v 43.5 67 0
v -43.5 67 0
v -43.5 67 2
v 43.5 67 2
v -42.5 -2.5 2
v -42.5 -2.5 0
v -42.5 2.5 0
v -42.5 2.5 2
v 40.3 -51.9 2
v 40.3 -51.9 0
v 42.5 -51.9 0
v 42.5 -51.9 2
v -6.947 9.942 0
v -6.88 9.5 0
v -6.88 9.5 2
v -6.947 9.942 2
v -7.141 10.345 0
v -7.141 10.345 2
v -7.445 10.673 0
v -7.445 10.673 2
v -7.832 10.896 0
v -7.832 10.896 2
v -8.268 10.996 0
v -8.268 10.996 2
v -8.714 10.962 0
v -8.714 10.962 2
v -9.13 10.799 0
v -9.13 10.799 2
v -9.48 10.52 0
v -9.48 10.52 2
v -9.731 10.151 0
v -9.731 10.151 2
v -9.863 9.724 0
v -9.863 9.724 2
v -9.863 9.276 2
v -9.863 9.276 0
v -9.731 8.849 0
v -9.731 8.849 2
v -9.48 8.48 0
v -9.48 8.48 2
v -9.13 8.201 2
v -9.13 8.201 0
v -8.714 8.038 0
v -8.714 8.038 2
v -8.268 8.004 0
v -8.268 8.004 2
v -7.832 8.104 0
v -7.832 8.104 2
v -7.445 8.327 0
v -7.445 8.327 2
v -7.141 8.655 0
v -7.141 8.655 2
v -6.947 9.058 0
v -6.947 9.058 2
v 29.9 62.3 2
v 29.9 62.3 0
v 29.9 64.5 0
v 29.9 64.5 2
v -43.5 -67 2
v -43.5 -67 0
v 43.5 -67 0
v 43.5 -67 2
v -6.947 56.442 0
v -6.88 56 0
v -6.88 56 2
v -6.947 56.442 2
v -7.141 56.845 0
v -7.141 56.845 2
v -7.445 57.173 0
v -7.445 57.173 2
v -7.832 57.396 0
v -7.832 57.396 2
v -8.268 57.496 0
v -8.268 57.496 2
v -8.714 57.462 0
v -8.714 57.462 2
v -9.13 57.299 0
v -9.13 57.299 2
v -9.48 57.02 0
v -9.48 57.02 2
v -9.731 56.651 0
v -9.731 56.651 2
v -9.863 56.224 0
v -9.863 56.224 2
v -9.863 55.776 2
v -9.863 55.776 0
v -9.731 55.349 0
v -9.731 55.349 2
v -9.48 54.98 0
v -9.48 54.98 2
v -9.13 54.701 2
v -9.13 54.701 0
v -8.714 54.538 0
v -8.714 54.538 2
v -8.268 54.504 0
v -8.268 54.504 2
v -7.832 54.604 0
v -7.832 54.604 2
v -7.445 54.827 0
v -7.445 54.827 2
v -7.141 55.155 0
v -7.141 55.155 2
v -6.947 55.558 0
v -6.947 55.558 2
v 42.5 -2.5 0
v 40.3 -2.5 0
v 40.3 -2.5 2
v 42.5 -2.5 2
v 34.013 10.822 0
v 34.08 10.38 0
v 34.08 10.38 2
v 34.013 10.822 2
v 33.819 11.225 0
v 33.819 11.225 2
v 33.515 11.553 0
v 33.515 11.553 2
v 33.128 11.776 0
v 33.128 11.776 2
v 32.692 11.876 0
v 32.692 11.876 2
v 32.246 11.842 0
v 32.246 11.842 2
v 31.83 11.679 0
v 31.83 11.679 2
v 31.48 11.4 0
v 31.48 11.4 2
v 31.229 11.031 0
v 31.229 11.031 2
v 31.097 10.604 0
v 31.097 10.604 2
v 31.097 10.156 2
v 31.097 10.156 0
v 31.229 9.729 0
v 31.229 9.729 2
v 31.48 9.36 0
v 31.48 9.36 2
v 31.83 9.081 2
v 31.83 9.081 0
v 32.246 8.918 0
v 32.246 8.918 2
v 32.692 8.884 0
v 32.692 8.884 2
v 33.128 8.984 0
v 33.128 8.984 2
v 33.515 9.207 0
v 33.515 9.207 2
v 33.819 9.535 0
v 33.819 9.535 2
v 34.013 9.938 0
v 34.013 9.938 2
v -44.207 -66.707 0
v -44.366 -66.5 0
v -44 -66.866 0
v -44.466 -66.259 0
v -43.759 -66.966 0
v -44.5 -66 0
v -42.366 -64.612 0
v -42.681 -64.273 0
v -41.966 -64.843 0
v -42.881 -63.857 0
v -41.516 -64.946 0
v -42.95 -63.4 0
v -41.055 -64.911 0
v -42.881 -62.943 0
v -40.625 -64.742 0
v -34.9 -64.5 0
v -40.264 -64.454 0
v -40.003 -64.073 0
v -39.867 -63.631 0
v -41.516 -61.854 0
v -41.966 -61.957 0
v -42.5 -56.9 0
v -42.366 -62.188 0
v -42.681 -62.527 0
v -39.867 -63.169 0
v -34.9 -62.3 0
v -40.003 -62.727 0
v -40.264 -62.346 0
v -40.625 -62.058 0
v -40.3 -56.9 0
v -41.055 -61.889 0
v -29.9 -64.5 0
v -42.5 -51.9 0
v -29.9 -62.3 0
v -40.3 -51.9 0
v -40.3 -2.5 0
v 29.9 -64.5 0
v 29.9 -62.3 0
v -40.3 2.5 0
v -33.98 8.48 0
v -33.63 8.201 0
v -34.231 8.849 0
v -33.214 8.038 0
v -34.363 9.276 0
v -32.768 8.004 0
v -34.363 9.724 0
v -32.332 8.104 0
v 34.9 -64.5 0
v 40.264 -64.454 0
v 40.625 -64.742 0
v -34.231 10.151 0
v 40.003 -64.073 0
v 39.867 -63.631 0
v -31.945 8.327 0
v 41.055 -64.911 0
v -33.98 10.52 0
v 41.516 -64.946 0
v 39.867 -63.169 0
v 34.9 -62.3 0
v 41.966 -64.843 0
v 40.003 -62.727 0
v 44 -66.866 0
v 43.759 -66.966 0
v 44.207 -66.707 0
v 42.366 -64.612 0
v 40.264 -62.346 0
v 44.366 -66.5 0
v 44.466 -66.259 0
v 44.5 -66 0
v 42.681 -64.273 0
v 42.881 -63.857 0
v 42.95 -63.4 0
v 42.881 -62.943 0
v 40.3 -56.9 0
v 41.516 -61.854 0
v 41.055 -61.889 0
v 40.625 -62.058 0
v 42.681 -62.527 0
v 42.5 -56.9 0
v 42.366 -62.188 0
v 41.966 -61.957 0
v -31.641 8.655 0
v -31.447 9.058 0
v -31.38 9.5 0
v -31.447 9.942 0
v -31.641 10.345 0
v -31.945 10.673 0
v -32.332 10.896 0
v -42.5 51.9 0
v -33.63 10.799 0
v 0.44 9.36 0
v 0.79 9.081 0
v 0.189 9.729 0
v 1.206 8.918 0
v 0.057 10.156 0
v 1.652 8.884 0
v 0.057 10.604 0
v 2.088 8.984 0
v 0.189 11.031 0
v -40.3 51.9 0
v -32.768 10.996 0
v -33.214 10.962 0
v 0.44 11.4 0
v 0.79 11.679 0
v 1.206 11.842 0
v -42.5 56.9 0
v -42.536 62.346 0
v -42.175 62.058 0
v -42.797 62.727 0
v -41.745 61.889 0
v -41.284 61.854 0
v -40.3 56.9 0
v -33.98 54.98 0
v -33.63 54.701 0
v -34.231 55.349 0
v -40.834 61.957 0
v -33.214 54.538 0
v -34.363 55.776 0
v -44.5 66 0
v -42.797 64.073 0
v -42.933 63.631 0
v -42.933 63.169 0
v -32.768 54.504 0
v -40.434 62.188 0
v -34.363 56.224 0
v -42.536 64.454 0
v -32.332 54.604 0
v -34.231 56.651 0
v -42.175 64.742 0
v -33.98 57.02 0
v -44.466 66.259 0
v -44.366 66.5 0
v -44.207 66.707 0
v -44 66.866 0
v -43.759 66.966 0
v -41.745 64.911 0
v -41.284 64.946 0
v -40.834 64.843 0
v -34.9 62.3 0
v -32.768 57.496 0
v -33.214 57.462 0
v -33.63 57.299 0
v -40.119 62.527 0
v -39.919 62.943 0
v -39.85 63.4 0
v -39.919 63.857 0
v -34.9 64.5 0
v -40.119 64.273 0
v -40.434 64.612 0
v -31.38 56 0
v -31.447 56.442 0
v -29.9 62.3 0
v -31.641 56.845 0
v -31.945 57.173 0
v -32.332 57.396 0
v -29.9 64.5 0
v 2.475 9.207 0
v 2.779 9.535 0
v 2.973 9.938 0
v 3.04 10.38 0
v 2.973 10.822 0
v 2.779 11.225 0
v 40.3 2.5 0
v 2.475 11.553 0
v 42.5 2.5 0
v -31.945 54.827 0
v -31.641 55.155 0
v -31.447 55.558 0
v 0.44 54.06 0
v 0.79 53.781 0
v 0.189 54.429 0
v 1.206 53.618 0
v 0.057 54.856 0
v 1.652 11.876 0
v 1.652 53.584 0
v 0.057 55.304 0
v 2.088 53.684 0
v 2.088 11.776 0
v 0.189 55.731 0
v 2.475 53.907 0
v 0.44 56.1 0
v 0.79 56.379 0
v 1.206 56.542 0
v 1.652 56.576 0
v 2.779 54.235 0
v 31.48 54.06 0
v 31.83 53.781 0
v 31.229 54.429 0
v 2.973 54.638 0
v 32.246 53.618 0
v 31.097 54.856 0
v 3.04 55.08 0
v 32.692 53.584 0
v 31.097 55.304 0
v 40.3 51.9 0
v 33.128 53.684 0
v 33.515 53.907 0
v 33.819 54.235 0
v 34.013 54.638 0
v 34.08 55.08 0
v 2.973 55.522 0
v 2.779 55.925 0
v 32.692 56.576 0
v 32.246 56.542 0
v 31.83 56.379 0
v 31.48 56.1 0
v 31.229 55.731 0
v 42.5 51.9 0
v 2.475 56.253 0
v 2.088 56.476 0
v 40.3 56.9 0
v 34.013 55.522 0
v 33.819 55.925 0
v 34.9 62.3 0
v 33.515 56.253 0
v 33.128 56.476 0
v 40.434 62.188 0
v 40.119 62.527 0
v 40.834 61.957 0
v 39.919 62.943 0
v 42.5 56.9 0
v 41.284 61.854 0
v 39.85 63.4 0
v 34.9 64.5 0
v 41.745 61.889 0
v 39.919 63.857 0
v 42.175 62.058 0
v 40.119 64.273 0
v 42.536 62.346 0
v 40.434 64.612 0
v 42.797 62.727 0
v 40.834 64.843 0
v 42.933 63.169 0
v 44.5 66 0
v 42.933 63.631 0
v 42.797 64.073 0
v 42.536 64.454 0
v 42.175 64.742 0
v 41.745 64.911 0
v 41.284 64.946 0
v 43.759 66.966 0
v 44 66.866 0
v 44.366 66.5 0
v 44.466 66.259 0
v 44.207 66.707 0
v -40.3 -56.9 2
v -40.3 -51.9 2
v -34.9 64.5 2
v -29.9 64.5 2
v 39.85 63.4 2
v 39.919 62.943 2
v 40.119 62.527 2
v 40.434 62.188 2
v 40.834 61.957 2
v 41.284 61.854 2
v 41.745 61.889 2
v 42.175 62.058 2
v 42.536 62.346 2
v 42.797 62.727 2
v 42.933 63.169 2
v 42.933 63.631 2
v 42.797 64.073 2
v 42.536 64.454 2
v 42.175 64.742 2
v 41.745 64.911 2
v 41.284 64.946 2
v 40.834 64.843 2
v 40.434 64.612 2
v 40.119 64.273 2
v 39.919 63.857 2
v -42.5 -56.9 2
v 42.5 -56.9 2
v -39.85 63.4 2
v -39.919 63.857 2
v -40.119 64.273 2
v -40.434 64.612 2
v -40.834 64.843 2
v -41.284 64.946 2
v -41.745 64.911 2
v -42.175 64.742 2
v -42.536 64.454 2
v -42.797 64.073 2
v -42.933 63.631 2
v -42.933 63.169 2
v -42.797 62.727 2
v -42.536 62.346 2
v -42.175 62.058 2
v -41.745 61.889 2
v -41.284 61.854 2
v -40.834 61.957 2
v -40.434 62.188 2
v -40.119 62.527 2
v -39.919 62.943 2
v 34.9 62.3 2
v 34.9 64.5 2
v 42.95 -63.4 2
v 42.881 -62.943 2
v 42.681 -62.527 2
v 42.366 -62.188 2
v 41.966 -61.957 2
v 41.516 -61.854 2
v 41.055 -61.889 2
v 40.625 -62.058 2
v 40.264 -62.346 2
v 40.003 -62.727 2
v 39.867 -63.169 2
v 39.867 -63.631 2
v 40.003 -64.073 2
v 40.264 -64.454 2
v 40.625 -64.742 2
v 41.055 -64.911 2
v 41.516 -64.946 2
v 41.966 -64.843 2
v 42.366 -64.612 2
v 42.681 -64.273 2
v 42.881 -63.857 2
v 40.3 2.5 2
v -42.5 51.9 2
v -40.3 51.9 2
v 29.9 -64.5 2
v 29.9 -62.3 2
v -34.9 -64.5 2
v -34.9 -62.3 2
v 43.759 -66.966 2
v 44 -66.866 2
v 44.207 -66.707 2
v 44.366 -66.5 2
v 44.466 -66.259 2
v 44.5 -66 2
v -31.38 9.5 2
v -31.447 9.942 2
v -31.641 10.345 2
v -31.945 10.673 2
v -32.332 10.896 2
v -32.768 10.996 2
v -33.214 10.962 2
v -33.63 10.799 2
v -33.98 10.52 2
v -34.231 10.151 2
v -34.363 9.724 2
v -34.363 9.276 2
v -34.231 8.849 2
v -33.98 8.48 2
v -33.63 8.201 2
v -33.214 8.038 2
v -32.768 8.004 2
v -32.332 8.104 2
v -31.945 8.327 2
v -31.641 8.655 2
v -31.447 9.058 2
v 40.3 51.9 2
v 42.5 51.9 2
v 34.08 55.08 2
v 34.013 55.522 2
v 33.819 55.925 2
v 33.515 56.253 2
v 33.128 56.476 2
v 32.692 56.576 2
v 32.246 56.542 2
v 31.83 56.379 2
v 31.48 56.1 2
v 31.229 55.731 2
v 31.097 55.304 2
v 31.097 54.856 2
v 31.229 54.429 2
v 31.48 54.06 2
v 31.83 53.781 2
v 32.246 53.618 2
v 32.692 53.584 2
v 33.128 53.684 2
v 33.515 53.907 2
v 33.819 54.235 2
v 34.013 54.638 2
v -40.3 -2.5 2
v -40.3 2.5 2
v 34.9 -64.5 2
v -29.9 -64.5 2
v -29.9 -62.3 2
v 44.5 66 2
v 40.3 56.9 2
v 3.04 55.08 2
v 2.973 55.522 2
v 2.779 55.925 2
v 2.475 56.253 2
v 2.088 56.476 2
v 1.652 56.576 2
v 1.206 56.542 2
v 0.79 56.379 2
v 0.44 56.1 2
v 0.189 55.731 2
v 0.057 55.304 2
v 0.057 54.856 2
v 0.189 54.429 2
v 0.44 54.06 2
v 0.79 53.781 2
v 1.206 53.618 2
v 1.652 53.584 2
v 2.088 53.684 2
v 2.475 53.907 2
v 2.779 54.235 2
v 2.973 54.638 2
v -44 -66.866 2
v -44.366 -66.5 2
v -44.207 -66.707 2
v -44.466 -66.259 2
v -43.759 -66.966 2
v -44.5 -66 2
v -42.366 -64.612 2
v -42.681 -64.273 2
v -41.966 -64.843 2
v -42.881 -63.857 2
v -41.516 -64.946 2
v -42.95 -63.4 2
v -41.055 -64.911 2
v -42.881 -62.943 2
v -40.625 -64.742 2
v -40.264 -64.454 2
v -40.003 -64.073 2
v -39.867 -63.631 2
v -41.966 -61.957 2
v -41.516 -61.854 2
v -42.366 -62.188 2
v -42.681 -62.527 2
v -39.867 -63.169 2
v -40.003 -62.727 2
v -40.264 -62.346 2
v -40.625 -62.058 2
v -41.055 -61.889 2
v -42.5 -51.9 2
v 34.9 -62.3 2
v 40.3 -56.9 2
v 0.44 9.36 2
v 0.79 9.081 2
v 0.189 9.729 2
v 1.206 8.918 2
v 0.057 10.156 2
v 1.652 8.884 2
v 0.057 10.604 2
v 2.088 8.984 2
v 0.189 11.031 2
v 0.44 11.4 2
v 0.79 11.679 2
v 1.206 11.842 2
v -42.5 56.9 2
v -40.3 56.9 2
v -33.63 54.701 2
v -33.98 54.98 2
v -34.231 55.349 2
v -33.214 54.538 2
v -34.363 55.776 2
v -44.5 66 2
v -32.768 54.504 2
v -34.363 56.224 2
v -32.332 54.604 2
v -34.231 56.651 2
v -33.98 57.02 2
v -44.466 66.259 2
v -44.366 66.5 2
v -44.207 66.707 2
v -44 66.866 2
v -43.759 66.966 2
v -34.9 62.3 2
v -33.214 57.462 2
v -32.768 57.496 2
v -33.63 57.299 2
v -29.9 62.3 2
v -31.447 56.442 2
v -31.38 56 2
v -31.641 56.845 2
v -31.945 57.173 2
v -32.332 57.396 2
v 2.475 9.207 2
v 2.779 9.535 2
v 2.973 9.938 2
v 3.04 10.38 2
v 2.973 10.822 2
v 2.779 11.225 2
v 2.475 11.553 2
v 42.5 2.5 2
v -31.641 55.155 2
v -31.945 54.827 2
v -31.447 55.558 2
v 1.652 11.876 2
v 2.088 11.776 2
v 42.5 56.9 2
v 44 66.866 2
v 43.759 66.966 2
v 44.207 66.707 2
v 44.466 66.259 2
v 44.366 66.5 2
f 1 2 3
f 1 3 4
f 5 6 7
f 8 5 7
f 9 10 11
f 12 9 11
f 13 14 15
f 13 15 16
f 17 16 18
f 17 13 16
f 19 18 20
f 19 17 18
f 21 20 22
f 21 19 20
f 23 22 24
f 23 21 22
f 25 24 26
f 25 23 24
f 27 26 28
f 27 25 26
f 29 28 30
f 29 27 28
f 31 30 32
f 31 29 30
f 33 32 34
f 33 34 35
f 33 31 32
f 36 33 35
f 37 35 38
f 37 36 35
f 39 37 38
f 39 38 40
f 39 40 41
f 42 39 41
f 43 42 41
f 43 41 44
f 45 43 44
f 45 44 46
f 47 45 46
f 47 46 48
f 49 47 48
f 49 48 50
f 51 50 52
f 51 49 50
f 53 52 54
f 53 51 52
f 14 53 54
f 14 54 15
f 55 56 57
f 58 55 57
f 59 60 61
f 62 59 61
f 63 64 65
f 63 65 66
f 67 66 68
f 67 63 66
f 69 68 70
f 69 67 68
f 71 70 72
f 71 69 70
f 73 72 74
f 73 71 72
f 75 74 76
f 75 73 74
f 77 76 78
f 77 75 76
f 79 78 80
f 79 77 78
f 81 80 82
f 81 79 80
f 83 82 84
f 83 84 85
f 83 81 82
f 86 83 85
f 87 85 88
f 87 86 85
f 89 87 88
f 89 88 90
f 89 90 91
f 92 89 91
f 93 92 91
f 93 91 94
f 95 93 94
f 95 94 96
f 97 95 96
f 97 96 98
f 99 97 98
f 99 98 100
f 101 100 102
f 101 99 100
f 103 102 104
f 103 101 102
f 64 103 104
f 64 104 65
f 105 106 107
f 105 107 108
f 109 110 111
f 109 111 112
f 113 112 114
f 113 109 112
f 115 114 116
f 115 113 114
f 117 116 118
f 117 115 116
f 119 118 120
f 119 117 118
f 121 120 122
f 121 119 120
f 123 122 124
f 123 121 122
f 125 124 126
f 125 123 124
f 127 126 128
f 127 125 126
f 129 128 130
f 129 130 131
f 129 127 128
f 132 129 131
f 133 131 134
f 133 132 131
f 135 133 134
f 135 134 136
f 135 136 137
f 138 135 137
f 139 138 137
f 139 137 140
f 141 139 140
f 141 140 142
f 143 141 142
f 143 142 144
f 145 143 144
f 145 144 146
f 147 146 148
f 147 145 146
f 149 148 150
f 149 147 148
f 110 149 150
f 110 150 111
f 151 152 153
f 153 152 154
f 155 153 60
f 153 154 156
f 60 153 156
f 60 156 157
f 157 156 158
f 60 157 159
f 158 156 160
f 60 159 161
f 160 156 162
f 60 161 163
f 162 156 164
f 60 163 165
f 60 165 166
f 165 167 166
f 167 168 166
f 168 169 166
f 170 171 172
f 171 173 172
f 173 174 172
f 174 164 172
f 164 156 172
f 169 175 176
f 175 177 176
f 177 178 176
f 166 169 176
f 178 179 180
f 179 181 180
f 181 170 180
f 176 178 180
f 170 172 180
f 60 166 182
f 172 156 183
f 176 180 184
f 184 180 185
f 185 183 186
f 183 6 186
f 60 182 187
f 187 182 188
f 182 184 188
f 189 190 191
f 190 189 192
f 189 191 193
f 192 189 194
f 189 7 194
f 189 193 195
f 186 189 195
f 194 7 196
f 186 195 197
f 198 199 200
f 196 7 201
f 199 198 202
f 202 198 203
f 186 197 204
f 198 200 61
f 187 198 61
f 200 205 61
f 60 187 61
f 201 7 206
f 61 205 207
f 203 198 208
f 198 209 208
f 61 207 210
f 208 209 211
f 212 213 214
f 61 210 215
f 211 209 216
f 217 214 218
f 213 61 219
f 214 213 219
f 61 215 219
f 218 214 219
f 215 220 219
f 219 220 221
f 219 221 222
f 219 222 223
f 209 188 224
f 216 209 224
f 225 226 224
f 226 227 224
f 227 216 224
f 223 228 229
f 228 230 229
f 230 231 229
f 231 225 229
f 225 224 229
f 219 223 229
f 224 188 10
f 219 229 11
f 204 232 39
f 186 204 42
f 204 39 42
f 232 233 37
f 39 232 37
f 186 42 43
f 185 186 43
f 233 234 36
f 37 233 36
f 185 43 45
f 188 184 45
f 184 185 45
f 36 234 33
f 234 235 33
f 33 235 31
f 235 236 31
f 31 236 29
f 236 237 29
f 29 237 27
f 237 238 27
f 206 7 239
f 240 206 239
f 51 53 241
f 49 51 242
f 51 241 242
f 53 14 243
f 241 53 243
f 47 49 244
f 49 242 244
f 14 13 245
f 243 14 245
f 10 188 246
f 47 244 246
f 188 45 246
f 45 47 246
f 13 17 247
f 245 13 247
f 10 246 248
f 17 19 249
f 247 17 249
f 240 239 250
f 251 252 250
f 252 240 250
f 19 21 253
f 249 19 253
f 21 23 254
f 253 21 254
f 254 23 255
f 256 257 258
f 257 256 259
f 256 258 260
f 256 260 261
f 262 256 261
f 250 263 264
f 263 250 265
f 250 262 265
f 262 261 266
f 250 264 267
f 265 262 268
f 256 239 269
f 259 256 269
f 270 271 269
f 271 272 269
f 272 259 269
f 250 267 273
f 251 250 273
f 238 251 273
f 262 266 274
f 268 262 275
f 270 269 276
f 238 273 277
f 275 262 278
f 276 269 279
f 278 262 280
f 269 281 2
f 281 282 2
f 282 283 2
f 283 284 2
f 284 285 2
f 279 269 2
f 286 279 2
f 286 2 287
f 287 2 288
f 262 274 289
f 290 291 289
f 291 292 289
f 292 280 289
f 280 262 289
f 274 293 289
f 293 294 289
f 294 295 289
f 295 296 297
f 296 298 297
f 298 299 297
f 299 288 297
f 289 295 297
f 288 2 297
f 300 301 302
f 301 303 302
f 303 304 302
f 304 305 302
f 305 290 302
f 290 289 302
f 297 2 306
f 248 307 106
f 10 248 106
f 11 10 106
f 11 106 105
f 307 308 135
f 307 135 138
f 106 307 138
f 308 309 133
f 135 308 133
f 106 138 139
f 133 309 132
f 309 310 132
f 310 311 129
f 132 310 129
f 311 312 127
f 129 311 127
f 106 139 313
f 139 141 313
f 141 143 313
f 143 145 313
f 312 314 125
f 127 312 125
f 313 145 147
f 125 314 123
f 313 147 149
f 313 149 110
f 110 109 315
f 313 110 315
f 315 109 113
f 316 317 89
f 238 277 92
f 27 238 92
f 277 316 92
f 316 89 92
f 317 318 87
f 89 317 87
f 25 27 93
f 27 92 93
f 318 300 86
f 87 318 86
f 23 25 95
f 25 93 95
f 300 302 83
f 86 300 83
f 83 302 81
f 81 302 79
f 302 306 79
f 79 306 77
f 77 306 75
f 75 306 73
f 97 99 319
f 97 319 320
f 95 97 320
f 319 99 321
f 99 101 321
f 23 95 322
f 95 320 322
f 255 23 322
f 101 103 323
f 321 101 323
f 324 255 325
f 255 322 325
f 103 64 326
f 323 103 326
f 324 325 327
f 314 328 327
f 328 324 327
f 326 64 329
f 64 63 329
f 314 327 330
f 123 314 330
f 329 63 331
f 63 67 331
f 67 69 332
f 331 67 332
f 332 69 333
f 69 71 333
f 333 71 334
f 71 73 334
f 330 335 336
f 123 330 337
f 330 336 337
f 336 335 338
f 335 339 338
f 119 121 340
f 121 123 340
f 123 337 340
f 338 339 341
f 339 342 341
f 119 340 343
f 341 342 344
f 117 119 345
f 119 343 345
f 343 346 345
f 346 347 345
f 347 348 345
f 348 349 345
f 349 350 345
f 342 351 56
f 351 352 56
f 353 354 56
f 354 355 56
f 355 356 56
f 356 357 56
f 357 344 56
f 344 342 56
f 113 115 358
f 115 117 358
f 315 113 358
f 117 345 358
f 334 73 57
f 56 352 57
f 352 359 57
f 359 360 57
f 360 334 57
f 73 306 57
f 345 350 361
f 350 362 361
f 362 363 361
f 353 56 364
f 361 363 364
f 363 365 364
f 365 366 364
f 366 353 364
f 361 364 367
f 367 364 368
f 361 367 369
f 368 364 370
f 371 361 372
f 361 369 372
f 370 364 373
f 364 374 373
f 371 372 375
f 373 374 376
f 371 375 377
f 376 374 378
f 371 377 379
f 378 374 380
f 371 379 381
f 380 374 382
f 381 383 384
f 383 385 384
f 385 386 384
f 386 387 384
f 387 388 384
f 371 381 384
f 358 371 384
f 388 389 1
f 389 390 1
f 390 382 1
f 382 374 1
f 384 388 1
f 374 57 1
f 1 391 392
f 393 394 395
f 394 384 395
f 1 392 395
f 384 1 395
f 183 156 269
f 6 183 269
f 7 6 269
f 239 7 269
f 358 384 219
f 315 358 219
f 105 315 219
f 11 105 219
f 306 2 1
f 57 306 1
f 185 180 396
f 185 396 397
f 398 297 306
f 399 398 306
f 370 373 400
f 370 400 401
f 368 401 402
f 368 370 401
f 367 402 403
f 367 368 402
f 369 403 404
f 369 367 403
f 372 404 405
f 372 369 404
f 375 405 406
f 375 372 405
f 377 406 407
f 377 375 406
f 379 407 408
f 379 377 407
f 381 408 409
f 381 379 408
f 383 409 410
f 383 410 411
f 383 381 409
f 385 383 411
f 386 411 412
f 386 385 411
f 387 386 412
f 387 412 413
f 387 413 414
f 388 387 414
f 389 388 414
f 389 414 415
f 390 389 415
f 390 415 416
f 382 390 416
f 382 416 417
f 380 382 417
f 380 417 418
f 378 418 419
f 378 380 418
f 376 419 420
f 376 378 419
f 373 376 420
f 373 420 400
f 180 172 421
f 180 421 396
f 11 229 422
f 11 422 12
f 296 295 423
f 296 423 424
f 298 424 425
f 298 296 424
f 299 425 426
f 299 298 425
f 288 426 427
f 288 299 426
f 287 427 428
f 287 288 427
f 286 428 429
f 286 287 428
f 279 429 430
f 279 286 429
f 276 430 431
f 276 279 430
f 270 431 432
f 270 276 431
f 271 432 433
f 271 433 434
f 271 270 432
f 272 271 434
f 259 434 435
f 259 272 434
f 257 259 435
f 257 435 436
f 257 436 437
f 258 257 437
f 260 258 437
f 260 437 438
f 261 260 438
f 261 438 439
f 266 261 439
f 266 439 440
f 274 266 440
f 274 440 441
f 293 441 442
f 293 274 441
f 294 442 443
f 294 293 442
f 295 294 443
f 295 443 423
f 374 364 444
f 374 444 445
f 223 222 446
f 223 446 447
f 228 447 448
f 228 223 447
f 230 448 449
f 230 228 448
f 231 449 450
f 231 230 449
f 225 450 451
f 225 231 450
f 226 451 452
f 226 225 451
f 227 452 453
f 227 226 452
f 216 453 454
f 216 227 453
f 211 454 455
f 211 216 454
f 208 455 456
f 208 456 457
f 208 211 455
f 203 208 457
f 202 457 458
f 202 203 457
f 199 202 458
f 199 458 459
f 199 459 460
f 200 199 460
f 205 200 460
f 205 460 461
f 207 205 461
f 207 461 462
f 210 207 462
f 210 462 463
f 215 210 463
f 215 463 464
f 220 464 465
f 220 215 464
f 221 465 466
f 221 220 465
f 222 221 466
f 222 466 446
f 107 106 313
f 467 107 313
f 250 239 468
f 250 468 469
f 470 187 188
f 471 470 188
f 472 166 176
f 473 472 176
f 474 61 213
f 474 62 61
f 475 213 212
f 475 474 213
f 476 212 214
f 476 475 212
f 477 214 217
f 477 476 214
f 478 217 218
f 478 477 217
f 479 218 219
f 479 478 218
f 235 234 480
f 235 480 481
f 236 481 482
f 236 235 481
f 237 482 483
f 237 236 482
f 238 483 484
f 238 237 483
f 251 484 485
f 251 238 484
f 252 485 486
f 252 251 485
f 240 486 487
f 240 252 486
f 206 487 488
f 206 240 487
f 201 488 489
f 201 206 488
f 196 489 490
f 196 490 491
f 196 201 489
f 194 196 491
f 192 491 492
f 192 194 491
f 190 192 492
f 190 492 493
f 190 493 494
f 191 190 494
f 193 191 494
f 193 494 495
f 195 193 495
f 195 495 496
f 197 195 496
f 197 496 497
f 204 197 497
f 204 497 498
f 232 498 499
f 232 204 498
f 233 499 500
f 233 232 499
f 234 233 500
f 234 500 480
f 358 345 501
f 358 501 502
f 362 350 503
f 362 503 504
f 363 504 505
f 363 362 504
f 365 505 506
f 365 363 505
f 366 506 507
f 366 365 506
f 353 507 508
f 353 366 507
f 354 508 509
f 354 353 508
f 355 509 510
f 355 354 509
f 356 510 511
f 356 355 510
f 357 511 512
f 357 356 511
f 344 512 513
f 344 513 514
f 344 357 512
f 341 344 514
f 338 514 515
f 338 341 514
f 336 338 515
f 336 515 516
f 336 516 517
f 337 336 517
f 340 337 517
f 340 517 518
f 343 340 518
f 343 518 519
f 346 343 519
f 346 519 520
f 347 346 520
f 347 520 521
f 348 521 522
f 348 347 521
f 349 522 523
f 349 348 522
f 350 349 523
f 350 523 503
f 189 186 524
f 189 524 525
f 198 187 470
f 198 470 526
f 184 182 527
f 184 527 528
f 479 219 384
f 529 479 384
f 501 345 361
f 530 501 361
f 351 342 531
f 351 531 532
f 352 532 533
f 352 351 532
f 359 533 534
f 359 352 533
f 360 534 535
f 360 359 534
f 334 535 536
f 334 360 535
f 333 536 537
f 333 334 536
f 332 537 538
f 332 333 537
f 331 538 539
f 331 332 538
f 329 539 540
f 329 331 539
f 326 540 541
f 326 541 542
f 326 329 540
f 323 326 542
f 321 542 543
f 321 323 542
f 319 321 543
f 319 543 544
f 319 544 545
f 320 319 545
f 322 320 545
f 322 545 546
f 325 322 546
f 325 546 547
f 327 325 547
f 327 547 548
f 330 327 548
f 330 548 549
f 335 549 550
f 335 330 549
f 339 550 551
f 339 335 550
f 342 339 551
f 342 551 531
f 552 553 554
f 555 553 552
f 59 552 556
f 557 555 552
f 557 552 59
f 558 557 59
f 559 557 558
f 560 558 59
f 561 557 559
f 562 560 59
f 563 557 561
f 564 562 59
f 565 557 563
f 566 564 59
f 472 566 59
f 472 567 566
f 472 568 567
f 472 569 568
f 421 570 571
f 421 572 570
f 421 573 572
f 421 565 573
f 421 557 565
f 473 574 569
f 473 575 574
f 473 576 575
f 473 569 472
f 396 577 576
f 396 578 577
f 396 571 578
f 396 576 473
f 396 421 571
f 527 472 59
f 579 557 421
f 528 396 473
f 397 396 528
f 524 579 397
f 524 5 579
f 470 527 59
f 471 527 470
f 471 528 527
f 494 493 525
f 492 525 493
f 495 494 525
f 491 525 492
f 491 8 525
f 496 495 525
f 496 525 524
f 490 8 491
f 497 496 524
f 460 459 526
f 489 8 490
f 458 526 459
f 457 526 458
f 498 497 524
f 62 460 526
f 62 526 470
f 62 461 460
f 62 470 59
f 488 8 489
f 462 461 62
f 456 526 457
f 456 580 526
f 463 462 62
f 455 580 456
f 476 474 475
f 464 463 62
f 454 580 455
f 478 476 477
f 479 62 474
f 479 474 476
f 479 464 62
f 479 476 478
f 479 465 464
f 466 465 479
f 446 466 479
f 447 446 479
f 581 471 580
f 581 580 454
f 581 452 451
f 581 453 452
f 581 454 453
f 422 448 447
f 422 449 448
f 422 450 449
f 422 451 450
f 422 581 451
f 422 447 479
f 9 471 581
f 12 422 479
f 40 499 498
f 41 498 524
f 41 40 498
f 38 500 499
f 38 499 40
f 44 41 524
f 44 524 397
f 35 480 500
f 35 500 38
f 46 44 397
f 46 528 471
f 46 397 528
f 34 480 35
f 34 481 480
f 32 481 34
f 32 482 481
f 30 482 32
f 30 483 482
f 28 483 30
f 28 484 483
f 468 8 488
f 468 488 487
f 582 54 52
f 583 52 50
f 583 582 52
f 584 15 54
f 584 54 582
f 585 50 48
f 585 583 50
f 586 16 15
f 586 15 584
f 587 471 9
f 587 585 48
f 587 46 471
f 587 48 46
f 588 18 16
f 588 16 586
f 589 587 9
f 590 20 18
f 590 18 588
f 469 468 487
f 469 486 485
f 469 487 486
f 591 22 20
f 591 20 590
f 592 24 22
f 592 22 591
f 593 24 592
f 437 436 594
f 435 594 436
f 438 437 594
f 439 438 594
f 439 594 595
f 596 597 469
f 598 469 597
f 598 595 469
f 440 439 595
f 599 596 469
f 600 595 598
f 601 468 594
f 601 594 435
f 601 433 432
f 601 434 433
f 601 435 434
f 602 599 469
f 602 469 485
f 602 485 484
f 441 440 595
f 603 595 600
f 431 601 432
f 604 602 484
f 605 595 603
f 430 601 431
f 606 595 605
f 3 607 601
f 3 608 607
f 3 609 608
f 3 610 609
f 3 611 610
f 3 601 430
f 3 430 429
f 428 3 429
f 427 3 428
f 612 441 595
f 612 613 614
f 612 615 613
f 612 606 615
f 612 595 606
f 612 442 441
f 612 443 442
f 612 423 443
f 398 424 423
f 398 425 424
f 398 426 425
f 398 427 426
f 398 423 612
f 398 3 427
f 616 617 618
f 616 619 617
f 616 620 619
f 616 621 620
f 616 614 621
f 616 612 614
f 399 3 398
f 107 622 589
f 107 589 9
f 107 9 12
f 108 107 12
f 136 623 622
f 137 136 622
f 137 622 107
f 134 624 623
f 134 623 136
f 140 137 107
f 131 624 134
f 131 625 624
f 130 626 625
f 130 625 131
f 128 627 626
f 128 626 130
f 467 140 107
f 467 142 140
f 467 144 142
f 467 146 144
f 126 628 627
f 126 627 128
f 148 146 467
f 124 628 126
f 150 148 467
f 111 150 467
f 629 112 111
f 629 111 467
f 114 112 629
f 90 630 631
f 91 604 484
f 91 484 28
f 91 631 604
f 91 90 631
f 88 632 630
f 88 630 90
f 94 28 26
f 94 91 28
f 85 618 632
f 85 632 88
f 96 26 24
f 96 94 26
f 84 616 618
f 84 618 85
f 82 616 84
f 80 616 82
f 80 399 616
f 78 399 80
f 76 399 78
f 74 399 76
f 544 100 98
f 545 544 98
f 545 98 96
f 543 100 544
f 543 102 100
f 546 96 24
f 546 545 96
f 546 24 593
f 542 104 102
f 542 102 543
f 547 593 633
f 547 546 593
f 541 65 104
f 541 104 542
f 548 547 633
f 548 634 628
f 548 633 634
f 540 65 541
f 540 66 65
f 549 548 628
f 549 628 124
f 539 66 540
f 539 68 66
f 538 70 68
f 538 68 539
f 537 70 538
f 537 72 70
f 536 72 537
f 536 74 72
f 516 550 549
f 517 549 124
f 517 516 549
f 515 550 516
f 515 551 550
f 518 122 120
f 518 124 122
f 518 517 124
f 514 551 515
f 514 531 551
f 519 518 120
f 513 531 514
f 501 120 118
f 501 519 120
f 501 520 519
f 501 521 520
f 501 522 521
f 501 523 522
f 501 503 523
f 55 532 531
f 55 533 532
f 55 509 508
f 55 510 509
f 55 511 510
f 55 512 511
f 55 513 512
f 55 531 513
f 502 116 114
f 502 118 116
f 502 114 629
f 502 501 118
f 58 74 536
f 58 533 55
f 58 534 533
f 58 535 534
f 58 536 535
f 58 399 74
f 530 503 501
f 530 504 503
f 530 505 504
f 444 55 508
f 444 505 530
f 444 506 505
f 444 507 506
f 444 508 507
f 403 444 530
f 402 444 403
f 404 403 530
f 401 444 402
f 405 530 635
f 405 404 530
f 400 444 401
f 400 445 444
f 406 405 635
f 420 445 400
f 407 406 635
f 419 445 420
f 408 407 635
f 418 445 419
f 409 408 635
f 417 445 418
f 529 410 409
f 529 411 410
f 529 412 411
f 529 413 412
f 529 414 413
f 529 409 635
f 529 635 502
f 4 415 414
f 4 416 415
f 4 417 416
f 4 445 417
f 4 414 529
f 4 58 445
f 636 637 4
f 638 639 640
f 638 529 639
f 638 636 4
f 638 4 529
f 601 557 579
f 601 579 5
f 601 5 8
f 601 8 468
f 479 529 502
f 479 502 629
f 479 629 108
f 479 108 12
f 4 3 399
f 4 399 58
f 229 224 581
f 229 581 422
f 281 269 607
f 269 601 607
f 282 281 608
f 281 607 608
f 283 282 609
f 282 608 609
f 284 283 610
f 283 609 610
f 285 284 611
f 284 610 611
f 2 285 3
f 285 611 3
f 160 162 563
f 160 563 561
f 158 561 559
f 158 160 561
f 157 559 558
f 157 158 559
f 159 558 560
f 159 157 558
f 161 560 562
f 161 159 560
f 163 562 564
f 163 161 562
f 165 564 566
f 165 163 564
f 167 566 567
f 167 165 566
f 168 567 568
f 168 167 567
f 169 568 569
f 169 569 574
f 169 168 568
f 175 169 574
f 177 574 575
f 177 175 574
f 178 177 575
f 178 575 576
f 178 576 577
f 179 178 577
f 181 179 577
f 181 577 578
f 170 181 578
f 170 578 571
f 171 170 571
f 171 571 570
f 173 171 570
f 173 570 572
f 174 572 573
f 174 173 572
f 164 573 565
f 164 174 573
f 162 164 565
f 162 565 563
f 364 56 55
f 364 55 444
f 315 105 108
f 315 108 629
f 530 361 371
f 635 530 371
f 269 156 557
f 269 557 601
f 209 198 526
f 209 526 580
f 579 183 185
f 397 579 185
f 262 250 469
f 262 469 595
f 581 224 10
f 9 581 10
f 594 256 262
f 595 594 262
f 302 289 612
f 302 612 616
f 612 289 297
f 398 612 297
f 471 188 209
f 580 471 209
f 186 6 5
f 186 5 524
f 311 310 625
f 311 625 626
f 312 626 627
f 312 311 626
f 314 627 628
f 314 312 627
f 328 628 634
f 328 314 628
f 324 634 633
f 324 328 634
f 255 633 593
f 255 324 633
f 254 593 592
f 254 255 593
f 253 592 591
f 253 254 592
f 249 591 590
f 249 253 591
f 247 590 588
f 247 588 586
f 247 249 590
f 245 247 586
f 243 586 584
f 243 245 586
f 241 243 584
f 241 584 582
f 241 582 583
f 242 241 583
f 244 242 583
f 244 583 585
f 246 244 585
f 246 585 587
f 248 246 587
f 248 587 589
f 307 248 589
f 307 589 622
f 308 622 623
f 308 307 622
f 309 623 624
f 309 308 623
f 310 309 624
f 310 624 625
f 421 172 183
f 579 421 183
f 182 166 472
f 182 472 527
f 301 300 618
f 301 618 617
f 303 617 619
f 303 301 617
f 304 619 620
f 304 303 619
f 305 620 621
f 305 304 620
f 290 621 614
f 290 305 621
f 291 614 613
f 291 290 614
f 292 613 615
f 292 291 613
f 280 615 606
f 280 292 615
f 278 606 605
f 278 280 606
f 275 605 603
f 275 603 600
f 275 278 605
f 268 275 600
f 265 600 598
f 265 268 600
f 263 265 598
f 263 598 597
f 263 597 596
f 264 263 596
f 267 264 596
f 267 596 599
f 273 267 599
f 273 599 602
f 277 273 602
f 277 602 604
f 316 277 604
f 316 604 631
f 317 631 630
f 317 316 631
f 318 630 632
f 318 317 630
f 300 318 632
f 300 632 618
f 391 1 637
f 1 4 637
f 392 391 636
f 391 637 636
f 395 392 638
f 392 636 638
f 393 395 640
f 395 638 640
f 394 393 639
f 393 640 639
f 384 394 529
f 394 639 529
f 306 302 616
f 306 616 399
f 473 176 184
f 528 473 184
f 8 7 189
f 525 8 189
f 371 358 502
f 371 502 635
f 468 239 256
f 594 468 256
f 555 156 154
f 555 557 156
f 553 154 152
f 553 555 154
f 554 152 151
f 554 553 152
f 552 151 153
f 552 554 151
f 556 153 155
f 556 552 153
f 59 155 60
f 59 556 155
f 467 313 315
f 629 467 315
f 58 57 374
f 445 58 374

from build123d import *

# Parameters (mm, degrees)
SKETCH1_W           = 89
SKETCH1_H           = 134
SKETCH1_R           = 1.5
SKETCH1_R_2         = 1.55
SKETCH1_W_2         = 2.2
SKETCH1_H_2         = 5
SKETCH1_W_3         = 5
SKETCH1_H_3         = 2.2
BOSS_EXTRUDE1_DEPTH = 2
FILLET1_R           = 1


with BuildPart() as part:
    # Sketch1 → Boss-Extrude1 (new body)
    with BuildSketch(Plane.XY):
        Rectangle(SKETCH1_W, SKETCH1_H)
        with Locations((-32.88, 56)):
            Circle(SKETCH1_R, mode=Mode.SUBTRACT)
        with Locations((-8.38, 56)):
            Circle(SKETCH1_R, mode=Mode.SUBTRACT)
        with Locations((-32.88, 9.5)):
            Circle(SKETCH1_R, mode=Mode.SUBTRACT)
        with Locations((-8.38, 9.5)):
            Circle(SKETCH1_R, mode=Mode.SUBTRACT)
        with Locations((1.54, 55.08)):
            Circle(SKETCH1_R, mode=Mode.SUBTRACT)
        with Locations((32.58, 55.08)):
            Circle(SKETCH1_R, mode=Mode.SUBTRACT)
        with Locations((1.54, 10.38)):
            Circle(SKETCH1_R, mode=Mode.SUBTRACT)
        with Locations((32.58, 10.38)):
            Circle(SKETCH1_R, mode=Mode.SUBTRACT)
        with Locations((-41.4, 63.4)):
            Circle(SKETCH1_R_2, mode=Mode.SUBTRACT)
        with Locations(Location((-41.4, -63.4, 0), (0, 0, 180))):
            Circle(SKETCH1_R_2, mode=Mode.SUBTRACT)
        with Locations((41.4, -63.4)):
            Circle(SKETCH1_R_2, mode=Mode.SUBTRACT)
        with Locations(Location((41.4, 63.4, 0), (0, 0, 180))):
            Circle(SKETCH1_R_2, mode=Mode.SUBTRACT)
        with Locations((-41.4, 0)):
            Rectangle(SKETCH1_W_2, SKETCH1_H_2, mode=Mode.SUBTRACT)
        with Locations((-41.4, -54.4)):
            Rectangle(SKETCH1_W_2, SKETCH1_H_2, mode=Mode.SUBTRACT)
        with Locations((-41.4, 54.4)):
            Rectangle(SKETCH1_W_2, SKETCH1_H_2, mode=Mode.SUBTRACT)
        with Locations((41.4, 54.4)):
            Rectangle(SKETCH1_W_2, SKETCH1_H_2, mode=Mode.SUBTRACT)
        with Locations((41.4, -54.4)):
            Rectangle(SKETCH1_W_2, SKETCH1_H_2, mode=Mode.SUBTRACT)
        with Locations((41.4, 0)):
            Rectangle(SKETCH1_W_2, SKETCH1_H_2, mode=Mode.SUBTRACT)
        with Locations((32.4, 63.4)):
            Rectangle(SKETCH1_W_3, SKETCH1_H_3, mode=Mode.SUBTRACT)
        with Locations((-32.4, 63.4)):
            Rectangle(SKETCH1_W_3, SKETCH1_H_3, mode=Mode.SUBTRACT)
        with Locations((32.4, -63.4)):
            Rectangle(SKETCH1_W_3, SKETCH1_H_3, mode=Mode.SUBTRACT)
        with Locations((-32.4, -63.4)):
            Rectangle(SKETCH1_W_3, SKETCH1_H_3, mode=Mode.SUBTRACT)
    extrude(amount=BOSS_EXTRUDE1_DEPTH)

    # Fillet1
    fillet1_edges = [part.edges().sort_by_distance(p)[0] for p in [
        (44.5, -67, 1),
        (-44.5, -67, 1),
        (-44.5, 67, 1),
        (44.5, 67, 1),
    ]]
    fillet(fillet1_edges, radius=FILLET1_R)


solid = part.part
